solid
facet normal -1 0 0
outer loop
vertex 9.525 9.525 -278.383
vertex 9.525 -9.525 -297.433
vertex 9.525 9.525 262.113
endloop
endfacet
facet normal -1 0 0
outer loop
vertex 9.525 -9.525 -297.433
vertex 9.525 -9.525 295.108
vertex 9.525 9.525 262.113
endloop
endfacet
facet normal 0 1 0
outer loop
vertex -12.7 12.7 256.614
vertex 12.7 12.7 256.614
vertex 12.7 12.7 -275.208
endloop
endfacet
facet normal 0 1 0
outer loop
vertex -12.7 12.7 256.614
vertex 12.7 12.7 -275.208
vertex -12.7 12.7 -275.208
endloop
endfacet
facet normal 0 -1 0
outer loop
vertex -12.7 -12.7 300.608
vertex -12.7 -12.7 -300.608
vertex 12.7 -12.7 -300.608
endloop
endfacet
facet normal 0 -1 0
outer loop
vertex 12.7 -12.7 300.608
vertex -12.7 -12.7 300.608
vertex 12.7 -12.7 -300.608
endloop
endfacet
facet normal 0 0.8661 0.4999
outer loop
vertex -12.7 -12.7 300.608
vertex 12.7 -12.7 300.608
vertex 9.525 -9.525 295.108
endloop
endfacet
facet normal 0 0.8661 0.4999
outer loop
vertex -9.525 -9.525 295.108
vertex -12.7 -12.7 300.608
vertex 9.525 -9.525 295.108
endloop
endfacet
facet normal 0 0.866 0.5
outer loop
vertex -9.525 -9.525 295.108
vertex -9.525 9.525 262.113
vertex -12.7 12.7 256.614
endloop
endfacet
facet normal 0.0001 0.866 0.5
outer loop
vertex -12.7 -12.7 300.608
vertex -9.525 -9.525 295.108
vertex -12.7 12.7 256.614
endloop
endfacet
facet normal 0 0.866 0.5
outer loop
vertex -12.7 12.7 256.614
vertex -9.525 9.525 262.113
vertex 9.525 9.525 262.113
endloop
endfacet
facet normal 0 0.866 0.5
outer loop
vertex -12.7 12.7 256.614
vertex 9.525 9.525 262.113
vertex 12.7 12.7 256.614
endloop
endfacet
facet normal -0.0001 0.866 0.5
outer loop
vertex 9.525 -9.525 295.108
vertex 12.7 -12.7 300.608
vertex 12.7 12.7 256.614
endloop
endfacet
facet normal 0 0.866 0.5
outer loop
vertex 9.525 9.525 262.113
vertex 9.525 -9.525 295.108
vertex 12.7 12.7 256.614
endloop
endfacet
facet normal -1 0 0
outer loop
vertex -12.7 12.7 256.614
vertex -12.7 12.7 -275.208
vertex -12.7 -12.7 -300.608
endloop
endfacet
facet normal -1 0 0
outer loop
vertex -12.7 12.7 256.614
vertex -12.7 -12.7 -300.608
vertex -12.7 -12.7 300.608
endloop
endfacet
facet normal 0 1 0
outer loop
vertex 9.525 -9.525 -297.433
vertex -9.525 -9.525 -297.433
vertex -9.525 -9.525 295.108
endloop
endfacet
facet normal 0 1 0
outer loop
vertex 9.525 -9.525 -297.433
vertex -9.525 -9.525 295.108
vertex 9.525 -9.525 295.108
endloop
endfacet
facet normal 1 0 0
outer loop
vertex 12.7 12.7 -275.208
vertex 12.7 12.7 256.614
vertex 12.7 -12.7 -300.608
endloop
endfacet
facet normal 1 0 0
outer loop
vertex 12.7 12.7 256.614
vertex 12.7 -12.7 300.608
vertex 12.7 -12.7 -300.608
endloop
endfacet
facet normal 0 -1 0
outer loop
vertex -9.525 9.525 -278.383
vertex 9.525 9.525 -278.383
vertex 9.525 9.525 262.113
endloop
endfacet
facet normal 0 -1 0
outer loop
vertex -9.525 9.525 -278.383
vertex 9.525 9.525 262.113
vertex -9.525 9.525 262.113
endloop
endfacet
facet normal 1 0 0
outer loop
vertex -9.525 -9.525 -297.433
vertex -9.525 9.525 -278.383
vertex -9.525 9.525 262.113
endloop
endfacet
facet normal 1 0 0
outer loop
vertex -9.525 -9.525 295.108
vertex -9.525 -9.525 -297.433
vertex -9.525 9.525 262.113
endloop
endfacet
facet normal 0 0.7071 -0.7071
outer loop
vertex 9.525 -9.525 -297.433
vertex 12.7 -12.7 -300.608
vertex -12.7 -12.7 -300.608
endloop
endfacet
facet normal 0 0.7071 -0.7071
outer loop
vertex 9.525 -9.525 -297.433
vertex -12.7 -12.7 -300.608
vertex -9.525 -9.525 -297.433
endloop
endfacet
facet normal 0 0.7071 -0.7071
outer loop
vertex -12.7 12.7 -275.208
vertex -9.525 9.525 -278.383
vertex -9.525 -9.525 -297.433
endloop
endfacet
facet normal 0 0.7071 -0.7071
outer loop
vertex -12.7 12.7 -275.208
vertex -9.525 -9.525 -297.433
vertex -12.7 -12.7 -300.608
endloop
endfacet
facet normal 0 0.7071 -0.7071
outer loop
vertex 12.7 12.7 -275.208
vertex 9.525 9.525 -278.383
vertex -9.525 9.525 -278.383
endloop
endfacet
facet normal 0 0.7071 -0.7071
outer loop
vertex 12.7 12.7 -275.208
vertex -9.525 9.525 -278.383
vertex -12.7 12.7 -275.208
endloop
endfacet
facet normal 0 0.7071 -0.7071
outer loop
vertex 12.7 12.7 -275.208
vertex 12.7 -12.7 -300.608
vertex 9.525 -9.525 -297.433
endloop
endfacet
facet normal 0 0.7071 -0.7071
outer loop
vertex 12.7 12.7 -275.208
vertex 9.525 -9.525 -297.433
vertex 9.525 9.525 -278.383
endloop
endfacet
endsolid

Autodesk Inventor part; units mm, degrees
ref_plane "YZ Plane" through (0, 0, 0) normal (1, 0, 0) x (0, 1, 0)
ref_plane "XZ Plane" through (0, 0, 0) normal (0, 1, 0) x (-1, 0, 0)
ref_plane "XY Plane" through (0, 0, 0) normal (0, 0, 1) x (1, 0, 0)
sketch "Sketch2" plane through (0, 0, 0) normal (0, 0, 1) x (1, 0, 0)
  line L0 (-12.7, -12.7) -> (12.7, -12.7)
  line L1 (12.7, -12.7) -> (12.7, 12.7)
  line L2 (12.7, 12.7) -> (-12.7, 12.7)
  line L3 (-12.7, 12.7) -> (-12.7, -12.7)
  line L4 (-12.7, -12.7) -> (12.7, 12.7) construction
  line L5 (12.7, -12.7) -> (-12.7, 12.7) construction
  line L6 (-9.525, -9.525) -> (9.525, -9.525)
  line L7 (9.525, -9.525) -> (9.525, 9.525)
  line L8 (9.525, 9.525) -> (-9.525, 9.525)
  line L9 (-9.525, 9.525) -> (-9.525, -9.525)
  line L10 (-9.525, -9.525) -> (9.525, 9.525) construction
  line L11 (9.525, -9.525) -> (-9.525, 9.525) construction
  point P0 (0, 0)
  dimension "d0" = 25.4
  dimension "d1" = 25.4
  dimension "d2" = 3.175
  dimension "d3" = 3.175
extrude "Extrusion1" add sketch "Sketch2" along normal mid plane 601.2155
sketch "Sketch3" plane through (12.7, -12.7, 300.6077) normal (1, 0, 0) x (0, 0, -1)
  line L0 (601.2155, 0) -> (0, 0) projected
  line L1 (0, 0) -> (43.9941, 25.4)
  line L2 (601.2155, 25.4) -> (0, 25.4) projected
  line L3 (43.9941, 25.4) -> (0, 25.4)
  line L4 (0, 0) -> (0, 25.4)
  line L5 (0, 3.175) -> (601.2155, 3.175) projected
  point P0 (300.6077, 12.7)
  dimension "d6" = 30
extrude "Extrusion2" cut sketch "Sketch3" against normal through all
sketch "Sketch5" plane through (12.7, -12.7, -300.6077) normal (1, 0, 0) x (0, 0, -1)
  line L0 (0, 0) -> (-25.4, 25.4)
  line L1 (-557.2214, 25.4) -> (0, 25.4) projected
  line L2 (0, 0) -> (-601.2155, 0) projected
  line L3 (-25.4, 25.4) -> (0, 25.4)
  line L4 (0, 0) -> (0, 25.4) projected
  line L5 (0, 25.4) -> (0, 0)
  point P0 (-300.6077, 12.7)
  dimension "d10" = 45
extrude "Extrusion3" cut sketch "Sketch5" against normal through all
properties part number "aluminumBallHandlerBase" material "Aluminum 6061-AHC"
